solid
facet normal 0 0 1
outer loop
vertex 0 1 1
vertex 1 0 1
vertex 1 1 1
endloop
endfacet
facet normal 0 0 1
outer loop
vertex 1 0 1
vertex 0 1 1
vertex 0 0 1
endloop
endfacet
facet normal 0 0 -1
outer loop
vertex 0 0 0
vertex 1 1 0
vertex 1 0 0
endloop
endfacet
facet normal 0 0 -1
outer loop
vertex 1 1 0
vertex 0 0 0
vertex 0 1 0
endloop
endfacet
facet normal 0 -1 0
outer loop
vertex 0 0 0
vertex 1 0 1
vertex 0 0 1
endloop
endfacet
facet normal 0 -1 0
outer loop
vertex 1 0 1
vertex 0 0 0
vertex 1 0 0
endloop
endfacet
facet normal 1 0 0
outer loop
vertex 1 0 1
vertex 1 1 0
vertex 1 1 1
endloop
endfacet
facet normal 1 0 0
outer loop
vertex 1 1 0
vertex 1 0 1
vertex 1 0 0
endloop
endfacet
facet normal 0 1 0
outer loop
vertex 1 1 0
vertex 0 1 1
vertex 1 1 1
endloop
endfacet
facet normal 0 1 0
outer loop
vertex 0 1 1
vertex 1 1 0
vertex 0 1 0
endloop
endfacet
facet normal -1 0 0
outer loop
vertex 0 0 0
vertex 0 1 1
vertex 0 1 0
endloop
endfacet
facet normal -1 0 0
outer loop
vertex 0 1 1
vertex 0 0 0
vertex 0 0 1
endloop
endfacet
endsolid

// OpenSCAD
// Value vector tests.

a1=[0,1,2];
b1=[3,4,5];
c1=a1*b1;
echo(str("Testing vector dot product: ",c1));

d1=[1,0];
echo(str("  Bounds check: ",a1*d1));

m2=[[0,1],[1,0]];
v2=[2,3];
p2=m2*v2;
echo(str("Testing matrix * vector: ",p2));

d2=[0,0,1];
echo(str("  Bounds check: ",m2*d2));

m3=[[1,-1,1],[1,0,-1]];
v3=[1,1];
p3=v3*m3;
echo(str("Testing vector * matrix: ",p3));

echo(str("  Bounds check: ",m3*v3));

ma4=[ [1,0],[0,1] ];
mb4=[ [1,0],[0,1] ];
echo(str("Testing id matrix * id matrix: ",ma4*mb4));

ma5=[ [1, 0, 1]
     ,[0, 1,-1] ];
mb5=[ [1,0]
     ,[0,1]
     ,[1,1] ];
echo(str("Testing asymmetric matrix * matrix: ",ma5*mb5));
echo(str("Testing alternate asymmetric matrix * matrix: ",mb5*ma5));

echo(str("  Bounds check: ",ma5*ma4));

cube(1.0);
